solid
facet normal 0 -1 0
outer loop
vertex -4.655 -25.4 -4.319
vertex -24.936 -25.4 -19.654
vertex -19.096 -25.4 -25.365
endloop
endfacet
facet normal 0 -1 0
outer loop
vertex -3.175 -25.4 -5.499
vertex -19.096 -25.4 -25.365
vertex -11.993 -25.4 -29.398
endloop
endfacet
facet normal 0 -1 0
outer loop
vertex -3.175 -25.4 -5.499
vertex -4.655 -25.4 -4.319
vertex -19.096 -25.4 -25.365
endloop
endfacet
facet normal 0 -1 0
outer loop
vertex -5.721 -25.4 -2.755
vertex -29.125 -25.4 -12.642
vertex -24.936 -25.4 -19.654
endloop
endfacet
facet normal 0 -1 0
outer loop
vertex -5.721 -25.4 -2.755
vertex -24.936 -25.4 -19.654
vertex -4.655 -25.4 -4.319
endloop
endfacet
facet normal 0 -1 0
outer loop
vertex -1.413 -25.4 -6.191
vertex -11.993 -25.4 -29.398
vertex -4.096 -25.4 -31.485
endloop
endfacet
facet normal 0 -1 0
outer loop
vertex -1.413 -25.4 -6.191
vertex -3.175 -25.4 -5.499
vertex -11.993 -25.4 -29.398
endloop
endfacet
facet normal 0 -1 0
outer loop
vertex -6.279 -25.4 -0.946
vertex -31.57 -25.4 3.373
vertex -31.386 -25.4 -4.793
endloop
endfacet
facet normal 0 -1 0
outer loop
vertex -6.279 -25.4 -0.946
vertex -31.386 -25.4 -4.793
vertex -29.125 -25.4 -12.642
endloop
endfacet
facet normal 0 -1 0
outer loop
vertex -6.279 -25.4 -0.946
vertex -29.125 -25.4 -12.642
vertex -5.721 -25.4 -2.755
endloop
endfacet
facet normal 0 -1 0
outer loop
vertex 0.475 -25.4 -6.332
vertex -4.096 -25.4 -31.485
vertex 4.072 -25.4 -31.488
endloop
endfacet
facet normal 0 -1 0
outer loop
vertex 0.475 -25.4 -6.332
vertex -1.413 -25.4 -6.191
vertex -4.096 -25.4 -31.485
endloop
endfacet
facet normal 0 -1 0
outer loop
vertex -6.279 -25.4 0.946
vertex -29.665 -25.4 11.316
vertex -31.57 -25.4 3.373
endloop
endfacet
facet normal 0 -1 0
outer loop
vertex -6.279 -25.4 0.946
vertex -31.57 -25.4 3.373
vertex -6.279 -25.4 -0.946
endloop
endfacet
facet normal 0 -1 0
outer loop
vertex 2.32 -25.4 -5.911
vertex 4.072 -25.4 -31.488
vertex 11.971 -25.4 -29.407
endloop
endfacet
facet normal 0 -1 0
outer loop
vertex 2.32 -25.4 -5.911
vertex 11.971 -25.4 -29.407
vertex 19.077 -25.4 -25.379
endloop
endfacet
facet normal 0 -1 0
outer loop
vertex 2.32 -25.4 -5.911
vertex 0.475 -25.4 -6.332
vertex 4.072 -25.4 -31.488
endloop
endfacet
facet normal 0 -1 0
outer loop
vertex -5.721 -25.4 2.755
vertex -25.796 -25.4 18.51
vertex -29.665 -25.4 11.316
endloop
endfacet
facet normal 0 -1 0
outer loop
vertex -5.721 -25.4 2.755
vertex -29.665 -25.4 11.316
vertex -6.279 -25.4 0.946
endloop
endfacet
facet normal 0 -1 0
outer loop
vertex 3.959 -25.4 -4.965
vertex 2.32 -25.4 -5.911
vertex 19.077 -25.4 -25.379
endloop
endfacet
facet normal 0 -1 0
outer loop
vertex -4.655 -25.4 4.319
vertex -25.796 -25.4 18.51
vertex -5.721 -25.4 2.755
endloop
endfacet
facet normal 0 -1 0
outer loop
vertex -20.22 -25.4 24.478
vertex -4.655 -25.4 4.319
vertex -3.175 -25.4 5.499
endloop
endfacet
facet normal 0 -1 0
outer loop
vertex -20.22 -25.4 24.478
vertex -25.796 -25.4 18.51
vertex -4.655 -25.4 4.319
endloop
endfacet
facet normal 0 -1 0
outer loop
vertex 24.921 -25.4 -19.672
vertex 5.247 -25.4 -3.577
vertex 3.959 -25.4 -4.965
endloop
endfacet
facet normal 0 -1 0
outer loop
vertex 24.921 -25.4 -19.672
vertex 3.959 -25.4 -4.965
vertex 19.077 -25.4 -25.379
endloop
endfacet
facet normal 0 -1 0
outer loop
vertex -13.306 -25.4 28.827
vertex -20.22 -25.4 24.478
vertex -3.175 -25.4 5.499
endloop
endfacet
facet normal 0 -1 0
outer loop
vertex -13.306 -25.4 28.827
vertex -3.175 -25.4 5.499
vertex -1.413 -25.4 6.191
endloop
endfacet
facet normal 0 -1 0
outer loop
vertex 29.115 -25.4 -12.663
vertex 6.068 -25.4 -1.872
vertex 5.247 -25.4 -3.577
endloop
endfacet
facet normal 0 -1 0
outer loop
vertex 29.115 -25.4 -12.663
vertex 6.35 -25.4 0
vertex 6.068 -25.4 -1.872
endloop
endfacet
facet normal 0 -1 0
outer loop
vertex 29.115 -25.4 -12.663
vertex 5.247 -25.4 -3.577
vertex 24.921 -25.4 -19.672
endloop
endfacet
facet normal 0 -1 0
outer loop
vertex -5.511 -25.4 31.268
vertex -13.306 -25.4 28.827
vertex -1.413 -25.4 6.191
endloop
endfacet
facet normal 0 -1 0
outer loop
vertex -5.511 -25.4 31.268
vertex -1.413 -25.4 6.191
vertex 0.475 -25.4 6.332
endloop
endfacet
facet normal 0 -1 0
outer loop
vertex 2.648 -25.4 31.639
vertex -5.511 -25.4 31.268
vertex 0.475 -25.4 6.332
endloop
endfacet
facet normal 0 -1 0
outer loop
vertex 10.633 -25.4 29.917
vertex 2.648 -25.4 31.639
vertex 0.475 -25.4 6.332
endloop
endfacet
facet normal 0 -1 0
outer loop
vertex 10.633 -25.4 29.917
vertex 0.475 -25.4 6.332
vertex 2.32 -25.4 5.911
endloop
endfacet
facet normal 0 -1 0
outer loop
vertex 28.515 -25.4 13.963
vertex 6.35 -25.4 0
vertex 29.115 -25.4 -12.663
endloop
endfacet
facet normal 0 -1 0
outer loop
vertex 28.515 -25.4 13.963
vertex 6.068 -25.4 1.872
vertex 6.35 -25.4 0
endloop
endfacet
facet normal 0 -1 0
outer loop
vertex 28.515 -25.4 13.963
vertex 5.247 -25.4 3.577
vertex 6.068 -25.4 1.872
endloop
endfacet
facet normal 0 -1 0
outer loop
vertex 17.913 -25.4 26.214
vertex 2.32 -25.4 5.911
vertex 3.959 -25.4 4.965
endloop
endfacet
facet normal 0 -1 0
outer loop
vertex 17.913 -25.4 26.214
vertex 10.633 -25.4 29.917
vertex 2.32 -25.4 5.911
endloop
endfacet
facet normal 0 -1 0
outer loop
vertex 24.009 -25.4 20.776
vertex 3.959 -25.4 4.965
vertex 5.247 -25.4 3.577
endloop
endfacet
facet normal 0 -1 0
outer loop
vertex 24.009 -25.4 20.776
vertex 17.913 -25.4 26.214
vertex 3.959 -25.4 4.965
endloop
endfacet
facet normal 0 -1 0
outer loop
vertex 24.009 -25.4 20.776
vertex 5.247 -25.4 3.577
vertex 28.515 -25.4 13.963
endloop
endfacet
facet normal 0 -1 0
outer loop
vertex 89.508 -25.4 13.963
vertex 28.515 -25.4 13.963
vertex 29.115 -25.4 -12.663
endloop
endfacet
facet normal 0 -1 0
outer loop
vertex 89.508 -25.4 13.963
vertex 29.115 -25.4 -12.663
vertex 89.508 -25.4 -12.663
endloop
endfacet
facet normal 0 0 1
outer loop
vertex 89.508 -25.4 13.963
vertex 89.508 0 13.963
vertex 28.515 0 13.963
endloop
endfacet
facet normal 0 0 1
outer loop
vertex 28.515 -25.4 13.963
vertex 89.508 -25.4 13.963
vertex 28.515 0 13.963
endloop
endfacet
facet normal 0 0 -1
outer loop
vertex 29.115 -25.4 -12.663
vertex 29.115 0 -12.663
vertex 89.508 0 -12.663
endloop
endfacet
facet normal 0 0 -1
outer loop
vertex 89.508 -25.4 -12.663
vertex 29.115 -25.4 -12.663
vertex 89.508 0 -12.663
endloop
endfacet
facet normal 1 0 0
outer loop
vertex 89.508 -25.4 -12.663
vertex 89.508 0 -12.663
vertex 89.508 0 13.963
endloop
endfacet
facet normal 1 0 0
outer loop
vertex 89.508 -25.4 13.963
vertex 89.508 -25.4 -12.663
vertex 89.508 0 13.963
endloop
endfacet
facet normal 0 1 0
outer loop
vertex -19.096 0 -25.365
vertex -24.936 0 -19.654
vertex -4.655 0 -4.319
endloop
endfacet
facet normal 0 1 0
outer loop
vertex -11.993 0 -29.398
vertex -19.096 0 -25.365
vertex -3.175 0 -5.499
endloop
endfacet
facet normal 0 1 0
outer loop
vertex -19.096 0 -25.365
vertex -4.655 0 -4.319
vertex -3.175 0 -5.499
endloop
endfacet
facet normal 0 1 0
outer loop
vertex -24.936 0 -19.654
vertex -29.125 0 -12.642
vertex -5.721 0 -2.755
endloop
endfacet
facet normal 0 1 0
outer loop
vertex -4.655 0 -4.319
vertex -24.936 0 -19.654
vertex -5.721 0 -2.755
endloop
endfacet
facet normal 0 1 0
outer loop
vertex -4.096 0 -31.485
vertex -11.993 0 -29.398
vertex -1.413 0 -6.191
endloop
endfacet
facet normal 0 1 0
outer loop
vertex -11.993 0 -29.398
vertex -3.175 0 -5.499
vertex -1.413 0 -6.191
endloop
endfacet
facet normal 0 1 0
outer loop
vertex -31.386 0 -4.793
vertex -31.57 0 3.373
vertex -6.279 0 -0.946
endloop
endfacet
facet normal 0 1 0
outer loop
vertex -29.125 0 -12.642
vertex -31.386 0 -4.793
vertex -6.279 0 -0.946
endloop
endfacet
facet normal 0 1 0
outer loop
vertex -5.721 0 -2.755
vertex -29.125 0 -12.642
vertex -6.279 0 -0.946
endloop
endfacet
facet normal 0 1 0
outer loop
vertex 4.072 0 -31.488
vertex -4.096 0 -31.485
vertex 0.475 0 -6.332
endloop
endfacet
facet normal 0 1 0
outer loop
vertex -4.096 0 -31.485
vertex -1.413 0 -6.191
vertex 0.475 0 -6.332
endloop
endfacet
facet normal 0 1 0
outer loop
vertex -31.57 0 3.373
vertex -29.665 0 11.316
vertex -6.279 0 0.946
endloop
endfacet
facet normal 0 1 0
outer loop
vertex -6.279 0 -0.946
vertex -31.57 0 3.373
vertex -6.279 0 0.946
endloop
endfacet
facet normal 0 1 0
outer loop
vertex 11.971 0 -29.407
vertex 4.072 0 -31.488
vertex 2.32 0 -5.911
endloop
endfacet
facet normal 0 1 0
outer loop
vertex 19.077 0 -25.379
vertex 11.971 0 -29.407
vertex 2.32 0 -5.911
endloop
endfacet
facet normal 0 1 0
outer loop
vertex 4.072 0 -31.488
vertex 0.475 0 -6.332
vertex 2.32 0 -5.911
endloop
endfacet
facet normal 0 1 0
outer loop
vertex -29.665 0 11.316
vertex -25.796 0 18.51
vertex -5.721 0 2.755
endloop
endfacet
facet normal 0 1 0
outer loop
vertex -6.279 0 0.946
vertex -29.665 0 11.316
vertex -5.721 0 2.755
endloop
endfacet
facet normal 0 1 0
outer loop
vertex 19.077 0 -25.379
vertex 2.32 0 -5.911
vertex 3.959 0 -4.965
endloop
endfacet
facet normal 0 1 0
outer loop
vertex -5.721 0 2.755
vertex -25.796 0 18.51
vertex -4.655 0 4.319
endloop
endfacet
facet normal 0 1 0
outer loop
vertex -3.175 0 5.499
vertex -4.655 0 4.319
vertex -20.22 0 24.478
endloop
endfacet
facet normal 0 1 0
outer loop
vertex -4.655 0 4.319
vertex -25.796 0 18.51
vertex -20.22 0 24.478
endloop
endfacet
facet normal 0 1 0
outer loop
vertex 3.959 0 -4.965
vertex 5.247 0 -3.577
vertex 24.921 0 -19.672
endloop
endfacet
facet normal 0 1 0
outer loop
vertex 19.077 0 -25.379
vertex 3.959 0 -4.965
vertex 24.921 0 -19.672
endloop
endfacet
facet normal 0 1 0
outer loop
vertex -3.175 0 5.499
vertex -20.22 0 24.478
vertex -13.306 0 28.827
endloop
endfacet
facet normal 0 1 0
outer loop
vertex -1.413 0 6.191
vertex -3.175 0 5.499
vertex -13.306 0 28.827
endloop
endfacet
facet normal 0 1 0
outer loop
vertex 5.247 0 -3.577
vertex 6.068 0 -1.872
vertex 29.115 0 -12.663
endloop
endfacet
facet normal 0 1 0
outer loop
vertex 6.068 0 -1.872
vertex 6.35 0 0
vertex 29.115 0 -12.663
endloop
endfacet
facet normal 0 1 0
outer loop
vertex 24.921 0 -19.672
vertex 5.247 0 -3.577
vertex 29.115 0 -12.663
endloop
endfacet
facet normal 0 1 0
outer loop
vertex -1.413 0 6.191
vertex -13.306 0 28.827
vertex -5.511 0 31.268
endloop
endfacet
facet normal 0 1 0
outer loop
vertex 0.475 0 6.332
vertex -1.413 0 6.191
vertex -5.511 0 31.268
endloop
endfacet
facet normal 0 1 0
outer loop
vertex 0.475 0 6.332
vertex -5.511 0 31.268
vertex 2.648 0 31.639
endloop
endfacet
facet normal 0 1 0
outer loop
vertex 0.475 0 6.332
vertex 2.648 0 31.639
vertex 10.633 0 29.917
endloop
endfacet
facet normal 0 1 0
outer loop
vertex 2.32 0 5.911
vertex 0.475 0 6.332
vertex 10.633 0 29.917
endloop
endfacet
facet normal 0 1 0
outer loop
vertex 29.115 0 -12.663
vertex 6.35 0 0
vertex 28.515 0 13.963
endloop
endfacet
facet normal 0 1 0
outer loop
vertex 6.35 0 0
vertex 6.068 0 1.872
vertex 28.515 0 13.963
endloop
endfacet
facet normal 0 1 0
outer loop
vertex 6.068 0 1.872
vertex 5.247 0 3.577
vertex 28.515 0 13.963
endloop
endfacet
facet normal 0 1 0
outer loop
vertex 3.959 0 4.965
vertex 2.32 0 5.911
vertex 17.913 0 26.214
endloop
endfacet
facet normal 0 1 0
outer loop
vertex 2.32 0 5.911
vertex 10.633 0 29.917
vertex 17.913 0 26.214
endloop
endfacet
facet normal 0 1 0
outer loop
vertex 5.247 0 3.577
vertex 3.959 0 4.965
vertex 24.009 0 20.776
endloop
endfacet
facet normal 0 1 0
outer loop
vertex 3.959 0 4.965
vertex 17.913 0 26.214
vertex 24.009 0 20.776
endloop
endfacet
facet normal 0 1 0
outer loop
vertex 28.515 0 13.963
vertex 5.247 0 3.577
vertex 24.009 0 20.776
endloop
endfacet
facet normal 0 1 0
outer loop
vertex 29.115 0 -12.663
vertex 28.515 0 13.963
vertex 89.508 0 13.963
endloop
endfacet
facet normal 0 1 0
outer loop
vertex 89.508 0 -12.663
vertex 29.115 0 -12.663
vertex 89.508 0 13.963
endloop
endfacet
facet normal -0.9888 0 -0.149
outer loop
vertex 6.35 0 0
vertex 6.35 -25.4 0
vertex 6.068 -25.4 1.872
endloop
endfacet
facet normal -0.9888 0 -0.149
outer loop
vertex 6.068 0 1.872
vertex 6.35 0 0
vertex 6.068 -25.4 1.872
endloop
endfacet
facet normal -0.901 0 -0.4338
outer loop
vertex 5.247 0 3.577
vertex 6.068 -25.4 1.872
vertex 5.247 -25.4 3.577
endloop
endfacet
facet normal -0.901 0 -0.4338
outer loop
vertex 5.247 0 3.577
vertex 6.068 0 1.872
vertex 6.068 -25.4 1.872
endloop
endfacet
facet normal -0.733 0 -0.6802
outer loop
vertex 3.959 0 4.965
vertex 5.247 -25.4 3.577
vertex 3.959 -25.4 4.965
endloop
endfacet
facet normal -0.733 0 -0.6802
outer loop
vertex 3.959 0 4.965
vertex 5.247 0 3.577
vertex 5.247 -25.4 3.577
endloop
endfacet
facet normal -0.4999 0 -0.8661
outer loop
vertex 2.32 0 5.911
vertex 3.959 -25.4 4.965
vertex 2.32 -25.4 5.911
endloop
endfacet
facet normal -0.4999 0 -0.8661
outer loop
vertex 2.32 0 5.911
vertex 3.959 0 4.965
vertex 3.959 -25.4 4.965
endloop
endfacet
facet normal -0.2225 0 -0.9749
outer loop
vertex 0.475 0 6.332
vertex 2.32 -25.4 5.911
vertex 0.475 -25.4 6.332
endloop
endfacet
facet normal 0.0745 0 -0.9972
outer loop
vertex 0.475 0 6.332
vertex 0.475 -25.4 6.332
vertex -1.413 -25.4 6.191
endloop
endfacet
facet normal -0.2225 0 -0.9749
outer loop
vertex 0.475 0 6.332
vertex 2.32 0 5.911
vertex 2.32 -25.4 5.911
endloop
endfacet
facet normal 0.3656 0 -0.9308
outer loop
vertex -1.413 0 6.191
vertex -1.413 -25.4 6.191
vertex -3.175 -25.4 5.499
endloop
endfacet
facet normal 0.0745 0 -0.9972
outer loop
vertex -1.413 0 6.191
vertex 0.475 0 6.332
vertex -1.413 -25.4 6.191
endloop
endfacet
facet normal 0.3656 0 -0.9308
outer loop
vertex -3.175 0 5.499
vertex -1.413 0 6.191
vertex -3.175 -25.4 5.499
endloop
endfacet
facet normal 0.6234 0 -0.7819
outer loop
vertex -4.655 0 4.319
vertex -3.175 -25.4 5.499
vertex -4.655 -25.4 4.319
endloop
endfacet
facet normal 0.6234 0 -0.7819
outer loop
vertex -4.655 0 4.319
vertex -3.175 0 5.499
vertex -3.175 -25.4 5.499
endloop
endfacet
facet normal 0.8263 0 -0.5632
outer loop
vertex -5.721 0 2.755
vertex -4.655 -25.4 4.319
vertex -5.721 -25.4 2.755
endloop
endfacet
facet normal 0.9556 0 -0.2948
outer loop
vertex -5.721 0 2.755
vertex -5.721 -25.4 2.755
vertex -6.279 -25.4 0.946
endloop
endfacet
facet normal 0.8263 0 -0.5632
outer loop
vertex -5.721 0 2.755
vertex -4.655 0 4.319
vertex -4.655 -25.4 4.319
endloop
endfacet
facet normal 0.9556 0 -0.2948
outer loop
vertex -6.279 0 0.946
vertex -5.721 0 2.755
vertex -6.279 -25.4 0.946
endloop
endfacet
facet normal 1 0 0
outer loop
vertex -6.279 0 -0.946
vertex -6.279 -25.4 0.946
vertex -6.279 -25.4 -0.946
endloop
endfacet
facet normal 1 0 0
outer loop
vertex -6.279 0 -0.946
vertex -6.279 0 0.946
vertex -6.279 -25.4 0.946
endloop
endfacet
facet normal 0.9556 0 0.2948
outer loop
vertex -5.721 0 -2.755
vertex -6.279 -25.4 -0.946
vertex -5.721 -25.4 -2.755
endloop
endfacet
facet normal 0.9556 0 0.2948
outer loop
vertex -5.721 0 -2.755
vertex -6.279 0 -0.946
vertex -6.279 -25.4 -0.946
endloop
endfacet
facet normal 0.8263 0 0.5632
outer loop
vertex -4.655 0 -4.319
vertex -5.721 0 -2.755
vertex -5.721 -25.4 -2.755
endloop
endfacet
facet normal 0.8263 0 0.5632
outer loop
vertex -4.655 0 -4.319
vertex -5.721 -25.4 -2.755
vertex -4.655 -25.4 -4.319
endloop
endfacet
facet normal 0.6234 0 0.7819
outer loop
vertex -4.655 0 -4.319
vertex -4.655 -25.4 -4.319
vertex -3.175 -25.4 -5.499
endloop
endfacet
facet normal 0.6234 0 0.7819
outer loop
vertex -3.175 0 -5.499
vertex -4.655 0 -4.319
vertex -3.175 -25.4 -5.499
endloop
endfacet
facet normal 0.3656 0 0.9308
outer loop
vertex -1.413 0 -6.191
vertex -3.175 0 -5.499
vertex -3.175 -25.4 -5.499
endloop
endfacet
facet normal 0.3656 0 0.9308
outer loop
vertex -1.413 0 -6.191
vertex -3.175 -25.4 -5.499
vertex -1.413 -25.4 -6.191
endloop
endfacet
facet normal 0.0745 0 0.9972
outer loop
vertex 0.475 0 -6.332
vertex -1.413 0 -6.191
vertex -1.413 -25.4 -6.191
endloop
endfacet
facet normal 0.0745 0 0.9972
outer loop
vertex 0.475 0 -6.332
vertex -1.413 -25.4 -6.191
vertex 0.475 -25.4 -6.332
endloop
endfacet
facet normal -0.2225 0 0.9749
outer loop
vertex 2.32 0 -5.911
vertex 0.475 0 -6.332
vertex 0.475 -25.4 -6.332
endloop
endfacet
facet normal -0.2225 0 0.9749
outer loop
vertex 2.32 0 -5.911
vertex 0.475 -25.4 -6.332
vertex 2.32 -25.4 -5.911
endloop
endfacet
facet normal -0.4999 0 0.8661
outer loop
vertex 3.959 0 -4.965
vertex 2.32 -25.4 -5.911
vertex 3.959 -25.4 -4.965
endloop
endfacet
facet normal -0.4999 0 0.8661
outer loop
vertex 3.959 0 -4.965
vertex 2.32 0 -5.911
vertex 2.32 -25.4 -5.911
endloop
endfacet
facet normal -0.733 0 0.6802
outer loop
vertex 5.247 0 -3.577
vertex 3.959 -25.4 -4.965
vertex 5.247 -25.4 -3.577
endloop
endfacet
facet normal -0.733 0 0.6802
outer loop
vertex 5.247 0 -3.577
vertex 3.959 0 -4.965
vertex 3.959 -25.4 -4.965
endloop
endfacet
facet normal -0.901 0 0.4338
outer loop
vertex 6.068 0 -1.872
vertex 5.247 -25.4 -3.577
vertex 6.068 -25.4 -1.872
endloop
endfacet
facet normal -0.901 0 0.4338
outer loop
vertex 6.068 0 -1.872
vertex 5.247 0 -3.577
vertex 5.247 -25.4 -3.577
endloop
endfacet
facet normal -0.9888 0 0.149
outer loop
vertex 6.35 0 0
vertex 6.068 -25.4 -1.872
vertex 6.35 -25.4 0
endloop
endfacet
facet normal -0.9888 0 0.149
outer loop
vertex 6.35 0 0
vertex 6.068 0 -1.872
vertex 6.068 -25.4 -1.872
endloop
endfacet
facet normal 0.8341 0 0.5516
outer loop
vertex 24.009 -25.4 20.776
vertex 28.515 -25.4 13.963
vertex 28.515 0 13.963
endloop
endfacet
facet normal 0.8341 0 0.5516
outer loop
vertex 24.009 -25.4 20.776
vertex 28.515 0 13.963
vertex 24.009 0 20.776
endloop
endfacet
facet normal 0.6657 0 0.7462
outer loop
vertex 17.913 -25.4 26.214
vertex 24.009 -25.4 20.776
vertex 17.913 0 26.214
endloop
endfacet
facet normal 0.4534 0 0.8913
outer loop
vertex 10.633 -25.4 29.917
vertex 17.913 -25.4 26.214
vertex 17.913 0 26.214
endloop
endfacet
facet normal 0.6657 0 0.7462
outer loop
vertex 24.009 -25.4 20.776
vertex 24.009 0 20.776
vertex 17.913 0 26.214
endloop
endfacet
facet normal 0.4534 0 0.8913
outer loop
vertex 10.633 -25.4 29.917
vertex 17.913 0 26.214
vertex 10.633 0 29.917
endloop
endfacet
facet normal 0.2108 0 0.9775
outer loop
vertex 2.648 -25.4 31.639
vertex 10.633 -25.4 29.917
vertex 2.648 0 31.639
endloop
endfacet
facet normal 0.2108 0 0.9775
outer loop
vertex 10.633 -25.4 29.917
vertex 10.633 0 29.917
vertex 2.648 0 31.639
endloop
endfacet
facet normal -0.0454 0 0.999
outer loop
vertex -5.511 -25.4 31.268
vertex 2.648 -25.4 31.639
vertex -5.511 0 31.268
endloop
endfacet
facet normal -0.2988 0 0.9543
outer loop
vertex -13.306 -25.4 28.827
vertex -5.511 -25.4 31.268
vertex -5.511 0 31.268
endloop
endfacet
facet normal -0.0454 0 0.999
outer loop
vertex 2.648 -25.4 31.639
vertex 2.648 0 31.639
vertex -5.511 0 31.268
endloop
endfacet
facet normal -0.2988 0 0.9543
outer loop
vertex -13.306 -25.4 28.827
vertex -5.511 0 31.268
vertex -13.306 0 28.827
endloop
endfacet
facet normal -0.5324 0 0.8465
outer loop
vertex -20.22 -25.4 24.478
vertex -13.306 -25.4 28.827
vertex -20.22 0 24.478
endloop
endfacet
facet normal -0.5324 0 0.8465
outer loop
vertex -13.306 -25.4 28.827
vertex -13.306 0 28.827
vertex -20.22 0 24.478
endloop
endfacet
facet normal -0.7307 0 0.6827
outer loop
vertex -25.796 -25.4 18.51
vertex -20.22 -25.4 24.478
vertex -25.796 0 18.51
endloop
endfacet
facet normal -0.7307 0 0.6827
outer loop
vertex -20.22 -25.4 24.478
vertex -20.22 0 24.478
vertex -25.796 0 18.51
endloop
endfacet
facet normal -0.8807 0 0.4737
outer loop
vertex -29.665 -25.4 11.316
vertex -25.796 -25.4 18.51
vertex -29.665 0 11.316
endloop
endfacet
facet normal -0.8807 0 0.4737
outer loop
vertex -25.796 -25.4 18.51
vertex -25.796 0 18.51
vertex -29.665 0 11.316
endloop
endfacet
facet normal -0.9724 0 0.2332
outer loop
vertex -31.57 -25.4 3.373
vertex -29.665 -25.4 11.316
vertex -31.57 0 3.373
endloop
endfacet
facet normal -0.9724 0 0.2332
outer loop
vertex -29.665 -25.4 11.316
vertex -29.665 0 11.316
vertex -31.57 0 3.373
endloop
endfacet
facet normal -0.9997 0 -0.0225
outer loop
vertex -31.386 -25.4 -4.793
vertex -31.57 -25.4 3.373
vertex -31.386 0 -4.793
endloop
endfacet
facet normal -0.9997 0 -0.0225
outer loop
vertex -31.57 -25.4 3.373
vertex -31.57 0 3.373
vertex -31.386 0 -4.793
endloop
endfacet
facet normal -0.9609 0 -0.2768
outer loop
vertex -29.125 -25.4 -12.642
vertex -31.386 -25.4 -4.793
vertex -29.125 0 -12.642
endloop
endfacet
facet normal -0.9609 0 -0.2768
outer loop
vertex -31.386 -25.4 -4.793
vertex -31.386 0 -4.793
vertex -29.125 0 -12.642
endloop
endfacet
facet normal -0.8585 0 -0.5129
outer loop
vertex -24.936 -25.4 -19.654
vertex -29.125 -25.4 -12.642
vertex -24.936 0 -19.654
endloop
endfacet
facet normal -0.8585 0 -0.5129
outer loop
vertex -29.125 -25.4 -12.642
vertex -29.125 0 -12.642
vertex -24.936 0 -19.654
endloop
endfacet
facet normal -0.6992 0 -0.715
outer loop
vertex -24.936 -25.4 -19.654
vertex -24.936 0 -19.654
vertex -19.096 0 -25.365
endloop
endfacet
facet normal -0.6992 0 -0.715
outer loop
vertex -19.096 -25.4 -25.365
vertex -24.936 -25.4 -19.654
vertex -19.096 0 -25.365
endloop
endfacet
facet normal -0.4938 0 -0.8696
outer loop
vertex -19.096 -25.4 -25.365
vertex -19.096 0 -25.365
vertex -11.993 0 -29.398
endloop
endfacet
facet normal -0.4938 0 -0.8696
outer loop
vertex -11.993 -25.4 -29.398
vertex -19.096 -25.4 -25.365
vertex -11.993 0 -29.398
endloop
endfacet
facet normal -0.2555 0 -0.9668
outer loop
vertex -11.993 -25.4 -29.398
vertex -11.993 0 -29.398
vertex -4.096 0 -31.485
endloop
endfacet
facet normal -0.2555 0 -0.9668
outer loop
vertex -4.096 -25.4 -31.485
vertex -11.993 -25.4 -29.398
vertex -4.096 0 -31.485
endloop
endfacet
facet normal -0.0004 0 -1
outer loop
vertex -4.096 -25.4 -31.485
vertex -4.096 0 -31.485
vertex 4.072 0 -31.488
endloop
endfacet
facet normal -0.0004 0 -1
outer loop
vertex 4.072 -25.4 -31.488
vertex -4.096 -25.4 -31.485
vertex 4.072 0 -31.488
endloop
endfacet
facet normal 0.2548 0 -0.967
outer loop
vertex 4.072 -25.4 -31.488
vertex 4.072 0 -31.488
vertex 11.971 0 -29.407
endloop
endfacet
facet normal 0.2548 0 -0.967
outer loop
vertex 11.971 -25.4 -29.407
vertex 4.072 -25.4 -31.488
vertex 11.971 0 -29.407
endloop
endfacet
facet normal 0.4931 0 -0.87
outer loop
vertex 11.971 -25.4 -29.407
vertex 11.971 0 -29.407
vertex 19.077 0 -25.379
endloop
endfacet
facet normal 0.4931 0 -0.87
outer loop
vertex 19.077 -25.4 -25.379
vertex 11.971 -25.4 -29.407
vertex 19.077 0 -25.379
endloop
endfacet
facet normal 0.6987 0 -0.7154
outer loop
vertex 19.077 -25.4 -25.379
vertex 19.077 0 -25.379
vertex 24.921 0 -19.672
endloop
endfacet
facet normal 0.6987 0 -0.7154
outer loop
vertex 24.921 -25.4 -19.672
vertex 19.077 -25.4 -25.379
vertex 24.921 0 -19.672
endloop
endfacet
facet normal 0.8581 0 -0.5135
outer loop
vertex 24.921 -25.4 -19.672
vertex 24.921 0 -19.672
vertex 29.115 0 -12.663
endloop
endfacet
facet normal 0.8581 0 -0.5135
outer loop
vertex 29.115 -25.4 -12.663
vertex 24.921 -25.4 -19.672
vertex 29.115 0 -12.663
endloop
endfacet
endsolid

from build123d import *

# Parameters (mm, degrees)
F0_R      = 6.35
F1_DEPTH  = 25.4
F1_FACE_R = 6.35
F2_DEPTH  = 13.97


with BuildPart() as f1:
    # F0 (on Front) → F1 (new body)
    with BuildSketch(Plane.XZ):
        with BuildLine():
            ThreePointArc((29.115278, -12.663454), (31.084342, -6.467318), (31.75, 0))
            ThreePointArc((31.75, 0), (30.930583, 7.166695), (28.514629, 13.963467))
            ThreePointArc((28.514629, 13.963467), (-31.741925, -0.716033), (29.115278, -12.663454))
        make_face()
        Circle(F0_R, mode=Mode.SUBTRACT)
        with BuildLine():
            ThreePointArc((28.514629, 13.963467), (30.930583, 7.166695), (31.75, 0))
            ThreePointArc((31.75, 0), (31.084342, -6.467318), (29.115278, -12.663454))
            Line((29.115278, -12.663454), (89.507588, -12.663454))
            Line((89.507588, -12.663454), (89.507588, 13.963467))
            Line((89.507588, 13.963467), (28.514629, 13.963467))
        make_face()
    extrude(amount=F1_DEPTH)

    # F1_face (on face) → F2 (join)
    with BuildSketch(Plane(origin=(20.425137, -25.4, 0.228165), x_dir=(1, 0, 0), z_dir=(0, -1, 0))):
        with BuildLine():
            ThreePointArc((8.089492, 13.735302), (-52.167062, -0.944198), (8.690141, -12.891619))
            Line((8.690141, -12.891619), (69.082451, -12.891619))
            Line((69.082451, -12.891619), (69.082451, 13.735302))
            Line((69.082451, 13.735302), (8.089492, 13.735302))
        make_face()
        with Locations((-20.425137, -0.228165)):
            Circle(F1_FACE_R, mode=Mode.SUBTRACT)
    extrude(amount=-F2_DEPTH)


solid = f1.part
